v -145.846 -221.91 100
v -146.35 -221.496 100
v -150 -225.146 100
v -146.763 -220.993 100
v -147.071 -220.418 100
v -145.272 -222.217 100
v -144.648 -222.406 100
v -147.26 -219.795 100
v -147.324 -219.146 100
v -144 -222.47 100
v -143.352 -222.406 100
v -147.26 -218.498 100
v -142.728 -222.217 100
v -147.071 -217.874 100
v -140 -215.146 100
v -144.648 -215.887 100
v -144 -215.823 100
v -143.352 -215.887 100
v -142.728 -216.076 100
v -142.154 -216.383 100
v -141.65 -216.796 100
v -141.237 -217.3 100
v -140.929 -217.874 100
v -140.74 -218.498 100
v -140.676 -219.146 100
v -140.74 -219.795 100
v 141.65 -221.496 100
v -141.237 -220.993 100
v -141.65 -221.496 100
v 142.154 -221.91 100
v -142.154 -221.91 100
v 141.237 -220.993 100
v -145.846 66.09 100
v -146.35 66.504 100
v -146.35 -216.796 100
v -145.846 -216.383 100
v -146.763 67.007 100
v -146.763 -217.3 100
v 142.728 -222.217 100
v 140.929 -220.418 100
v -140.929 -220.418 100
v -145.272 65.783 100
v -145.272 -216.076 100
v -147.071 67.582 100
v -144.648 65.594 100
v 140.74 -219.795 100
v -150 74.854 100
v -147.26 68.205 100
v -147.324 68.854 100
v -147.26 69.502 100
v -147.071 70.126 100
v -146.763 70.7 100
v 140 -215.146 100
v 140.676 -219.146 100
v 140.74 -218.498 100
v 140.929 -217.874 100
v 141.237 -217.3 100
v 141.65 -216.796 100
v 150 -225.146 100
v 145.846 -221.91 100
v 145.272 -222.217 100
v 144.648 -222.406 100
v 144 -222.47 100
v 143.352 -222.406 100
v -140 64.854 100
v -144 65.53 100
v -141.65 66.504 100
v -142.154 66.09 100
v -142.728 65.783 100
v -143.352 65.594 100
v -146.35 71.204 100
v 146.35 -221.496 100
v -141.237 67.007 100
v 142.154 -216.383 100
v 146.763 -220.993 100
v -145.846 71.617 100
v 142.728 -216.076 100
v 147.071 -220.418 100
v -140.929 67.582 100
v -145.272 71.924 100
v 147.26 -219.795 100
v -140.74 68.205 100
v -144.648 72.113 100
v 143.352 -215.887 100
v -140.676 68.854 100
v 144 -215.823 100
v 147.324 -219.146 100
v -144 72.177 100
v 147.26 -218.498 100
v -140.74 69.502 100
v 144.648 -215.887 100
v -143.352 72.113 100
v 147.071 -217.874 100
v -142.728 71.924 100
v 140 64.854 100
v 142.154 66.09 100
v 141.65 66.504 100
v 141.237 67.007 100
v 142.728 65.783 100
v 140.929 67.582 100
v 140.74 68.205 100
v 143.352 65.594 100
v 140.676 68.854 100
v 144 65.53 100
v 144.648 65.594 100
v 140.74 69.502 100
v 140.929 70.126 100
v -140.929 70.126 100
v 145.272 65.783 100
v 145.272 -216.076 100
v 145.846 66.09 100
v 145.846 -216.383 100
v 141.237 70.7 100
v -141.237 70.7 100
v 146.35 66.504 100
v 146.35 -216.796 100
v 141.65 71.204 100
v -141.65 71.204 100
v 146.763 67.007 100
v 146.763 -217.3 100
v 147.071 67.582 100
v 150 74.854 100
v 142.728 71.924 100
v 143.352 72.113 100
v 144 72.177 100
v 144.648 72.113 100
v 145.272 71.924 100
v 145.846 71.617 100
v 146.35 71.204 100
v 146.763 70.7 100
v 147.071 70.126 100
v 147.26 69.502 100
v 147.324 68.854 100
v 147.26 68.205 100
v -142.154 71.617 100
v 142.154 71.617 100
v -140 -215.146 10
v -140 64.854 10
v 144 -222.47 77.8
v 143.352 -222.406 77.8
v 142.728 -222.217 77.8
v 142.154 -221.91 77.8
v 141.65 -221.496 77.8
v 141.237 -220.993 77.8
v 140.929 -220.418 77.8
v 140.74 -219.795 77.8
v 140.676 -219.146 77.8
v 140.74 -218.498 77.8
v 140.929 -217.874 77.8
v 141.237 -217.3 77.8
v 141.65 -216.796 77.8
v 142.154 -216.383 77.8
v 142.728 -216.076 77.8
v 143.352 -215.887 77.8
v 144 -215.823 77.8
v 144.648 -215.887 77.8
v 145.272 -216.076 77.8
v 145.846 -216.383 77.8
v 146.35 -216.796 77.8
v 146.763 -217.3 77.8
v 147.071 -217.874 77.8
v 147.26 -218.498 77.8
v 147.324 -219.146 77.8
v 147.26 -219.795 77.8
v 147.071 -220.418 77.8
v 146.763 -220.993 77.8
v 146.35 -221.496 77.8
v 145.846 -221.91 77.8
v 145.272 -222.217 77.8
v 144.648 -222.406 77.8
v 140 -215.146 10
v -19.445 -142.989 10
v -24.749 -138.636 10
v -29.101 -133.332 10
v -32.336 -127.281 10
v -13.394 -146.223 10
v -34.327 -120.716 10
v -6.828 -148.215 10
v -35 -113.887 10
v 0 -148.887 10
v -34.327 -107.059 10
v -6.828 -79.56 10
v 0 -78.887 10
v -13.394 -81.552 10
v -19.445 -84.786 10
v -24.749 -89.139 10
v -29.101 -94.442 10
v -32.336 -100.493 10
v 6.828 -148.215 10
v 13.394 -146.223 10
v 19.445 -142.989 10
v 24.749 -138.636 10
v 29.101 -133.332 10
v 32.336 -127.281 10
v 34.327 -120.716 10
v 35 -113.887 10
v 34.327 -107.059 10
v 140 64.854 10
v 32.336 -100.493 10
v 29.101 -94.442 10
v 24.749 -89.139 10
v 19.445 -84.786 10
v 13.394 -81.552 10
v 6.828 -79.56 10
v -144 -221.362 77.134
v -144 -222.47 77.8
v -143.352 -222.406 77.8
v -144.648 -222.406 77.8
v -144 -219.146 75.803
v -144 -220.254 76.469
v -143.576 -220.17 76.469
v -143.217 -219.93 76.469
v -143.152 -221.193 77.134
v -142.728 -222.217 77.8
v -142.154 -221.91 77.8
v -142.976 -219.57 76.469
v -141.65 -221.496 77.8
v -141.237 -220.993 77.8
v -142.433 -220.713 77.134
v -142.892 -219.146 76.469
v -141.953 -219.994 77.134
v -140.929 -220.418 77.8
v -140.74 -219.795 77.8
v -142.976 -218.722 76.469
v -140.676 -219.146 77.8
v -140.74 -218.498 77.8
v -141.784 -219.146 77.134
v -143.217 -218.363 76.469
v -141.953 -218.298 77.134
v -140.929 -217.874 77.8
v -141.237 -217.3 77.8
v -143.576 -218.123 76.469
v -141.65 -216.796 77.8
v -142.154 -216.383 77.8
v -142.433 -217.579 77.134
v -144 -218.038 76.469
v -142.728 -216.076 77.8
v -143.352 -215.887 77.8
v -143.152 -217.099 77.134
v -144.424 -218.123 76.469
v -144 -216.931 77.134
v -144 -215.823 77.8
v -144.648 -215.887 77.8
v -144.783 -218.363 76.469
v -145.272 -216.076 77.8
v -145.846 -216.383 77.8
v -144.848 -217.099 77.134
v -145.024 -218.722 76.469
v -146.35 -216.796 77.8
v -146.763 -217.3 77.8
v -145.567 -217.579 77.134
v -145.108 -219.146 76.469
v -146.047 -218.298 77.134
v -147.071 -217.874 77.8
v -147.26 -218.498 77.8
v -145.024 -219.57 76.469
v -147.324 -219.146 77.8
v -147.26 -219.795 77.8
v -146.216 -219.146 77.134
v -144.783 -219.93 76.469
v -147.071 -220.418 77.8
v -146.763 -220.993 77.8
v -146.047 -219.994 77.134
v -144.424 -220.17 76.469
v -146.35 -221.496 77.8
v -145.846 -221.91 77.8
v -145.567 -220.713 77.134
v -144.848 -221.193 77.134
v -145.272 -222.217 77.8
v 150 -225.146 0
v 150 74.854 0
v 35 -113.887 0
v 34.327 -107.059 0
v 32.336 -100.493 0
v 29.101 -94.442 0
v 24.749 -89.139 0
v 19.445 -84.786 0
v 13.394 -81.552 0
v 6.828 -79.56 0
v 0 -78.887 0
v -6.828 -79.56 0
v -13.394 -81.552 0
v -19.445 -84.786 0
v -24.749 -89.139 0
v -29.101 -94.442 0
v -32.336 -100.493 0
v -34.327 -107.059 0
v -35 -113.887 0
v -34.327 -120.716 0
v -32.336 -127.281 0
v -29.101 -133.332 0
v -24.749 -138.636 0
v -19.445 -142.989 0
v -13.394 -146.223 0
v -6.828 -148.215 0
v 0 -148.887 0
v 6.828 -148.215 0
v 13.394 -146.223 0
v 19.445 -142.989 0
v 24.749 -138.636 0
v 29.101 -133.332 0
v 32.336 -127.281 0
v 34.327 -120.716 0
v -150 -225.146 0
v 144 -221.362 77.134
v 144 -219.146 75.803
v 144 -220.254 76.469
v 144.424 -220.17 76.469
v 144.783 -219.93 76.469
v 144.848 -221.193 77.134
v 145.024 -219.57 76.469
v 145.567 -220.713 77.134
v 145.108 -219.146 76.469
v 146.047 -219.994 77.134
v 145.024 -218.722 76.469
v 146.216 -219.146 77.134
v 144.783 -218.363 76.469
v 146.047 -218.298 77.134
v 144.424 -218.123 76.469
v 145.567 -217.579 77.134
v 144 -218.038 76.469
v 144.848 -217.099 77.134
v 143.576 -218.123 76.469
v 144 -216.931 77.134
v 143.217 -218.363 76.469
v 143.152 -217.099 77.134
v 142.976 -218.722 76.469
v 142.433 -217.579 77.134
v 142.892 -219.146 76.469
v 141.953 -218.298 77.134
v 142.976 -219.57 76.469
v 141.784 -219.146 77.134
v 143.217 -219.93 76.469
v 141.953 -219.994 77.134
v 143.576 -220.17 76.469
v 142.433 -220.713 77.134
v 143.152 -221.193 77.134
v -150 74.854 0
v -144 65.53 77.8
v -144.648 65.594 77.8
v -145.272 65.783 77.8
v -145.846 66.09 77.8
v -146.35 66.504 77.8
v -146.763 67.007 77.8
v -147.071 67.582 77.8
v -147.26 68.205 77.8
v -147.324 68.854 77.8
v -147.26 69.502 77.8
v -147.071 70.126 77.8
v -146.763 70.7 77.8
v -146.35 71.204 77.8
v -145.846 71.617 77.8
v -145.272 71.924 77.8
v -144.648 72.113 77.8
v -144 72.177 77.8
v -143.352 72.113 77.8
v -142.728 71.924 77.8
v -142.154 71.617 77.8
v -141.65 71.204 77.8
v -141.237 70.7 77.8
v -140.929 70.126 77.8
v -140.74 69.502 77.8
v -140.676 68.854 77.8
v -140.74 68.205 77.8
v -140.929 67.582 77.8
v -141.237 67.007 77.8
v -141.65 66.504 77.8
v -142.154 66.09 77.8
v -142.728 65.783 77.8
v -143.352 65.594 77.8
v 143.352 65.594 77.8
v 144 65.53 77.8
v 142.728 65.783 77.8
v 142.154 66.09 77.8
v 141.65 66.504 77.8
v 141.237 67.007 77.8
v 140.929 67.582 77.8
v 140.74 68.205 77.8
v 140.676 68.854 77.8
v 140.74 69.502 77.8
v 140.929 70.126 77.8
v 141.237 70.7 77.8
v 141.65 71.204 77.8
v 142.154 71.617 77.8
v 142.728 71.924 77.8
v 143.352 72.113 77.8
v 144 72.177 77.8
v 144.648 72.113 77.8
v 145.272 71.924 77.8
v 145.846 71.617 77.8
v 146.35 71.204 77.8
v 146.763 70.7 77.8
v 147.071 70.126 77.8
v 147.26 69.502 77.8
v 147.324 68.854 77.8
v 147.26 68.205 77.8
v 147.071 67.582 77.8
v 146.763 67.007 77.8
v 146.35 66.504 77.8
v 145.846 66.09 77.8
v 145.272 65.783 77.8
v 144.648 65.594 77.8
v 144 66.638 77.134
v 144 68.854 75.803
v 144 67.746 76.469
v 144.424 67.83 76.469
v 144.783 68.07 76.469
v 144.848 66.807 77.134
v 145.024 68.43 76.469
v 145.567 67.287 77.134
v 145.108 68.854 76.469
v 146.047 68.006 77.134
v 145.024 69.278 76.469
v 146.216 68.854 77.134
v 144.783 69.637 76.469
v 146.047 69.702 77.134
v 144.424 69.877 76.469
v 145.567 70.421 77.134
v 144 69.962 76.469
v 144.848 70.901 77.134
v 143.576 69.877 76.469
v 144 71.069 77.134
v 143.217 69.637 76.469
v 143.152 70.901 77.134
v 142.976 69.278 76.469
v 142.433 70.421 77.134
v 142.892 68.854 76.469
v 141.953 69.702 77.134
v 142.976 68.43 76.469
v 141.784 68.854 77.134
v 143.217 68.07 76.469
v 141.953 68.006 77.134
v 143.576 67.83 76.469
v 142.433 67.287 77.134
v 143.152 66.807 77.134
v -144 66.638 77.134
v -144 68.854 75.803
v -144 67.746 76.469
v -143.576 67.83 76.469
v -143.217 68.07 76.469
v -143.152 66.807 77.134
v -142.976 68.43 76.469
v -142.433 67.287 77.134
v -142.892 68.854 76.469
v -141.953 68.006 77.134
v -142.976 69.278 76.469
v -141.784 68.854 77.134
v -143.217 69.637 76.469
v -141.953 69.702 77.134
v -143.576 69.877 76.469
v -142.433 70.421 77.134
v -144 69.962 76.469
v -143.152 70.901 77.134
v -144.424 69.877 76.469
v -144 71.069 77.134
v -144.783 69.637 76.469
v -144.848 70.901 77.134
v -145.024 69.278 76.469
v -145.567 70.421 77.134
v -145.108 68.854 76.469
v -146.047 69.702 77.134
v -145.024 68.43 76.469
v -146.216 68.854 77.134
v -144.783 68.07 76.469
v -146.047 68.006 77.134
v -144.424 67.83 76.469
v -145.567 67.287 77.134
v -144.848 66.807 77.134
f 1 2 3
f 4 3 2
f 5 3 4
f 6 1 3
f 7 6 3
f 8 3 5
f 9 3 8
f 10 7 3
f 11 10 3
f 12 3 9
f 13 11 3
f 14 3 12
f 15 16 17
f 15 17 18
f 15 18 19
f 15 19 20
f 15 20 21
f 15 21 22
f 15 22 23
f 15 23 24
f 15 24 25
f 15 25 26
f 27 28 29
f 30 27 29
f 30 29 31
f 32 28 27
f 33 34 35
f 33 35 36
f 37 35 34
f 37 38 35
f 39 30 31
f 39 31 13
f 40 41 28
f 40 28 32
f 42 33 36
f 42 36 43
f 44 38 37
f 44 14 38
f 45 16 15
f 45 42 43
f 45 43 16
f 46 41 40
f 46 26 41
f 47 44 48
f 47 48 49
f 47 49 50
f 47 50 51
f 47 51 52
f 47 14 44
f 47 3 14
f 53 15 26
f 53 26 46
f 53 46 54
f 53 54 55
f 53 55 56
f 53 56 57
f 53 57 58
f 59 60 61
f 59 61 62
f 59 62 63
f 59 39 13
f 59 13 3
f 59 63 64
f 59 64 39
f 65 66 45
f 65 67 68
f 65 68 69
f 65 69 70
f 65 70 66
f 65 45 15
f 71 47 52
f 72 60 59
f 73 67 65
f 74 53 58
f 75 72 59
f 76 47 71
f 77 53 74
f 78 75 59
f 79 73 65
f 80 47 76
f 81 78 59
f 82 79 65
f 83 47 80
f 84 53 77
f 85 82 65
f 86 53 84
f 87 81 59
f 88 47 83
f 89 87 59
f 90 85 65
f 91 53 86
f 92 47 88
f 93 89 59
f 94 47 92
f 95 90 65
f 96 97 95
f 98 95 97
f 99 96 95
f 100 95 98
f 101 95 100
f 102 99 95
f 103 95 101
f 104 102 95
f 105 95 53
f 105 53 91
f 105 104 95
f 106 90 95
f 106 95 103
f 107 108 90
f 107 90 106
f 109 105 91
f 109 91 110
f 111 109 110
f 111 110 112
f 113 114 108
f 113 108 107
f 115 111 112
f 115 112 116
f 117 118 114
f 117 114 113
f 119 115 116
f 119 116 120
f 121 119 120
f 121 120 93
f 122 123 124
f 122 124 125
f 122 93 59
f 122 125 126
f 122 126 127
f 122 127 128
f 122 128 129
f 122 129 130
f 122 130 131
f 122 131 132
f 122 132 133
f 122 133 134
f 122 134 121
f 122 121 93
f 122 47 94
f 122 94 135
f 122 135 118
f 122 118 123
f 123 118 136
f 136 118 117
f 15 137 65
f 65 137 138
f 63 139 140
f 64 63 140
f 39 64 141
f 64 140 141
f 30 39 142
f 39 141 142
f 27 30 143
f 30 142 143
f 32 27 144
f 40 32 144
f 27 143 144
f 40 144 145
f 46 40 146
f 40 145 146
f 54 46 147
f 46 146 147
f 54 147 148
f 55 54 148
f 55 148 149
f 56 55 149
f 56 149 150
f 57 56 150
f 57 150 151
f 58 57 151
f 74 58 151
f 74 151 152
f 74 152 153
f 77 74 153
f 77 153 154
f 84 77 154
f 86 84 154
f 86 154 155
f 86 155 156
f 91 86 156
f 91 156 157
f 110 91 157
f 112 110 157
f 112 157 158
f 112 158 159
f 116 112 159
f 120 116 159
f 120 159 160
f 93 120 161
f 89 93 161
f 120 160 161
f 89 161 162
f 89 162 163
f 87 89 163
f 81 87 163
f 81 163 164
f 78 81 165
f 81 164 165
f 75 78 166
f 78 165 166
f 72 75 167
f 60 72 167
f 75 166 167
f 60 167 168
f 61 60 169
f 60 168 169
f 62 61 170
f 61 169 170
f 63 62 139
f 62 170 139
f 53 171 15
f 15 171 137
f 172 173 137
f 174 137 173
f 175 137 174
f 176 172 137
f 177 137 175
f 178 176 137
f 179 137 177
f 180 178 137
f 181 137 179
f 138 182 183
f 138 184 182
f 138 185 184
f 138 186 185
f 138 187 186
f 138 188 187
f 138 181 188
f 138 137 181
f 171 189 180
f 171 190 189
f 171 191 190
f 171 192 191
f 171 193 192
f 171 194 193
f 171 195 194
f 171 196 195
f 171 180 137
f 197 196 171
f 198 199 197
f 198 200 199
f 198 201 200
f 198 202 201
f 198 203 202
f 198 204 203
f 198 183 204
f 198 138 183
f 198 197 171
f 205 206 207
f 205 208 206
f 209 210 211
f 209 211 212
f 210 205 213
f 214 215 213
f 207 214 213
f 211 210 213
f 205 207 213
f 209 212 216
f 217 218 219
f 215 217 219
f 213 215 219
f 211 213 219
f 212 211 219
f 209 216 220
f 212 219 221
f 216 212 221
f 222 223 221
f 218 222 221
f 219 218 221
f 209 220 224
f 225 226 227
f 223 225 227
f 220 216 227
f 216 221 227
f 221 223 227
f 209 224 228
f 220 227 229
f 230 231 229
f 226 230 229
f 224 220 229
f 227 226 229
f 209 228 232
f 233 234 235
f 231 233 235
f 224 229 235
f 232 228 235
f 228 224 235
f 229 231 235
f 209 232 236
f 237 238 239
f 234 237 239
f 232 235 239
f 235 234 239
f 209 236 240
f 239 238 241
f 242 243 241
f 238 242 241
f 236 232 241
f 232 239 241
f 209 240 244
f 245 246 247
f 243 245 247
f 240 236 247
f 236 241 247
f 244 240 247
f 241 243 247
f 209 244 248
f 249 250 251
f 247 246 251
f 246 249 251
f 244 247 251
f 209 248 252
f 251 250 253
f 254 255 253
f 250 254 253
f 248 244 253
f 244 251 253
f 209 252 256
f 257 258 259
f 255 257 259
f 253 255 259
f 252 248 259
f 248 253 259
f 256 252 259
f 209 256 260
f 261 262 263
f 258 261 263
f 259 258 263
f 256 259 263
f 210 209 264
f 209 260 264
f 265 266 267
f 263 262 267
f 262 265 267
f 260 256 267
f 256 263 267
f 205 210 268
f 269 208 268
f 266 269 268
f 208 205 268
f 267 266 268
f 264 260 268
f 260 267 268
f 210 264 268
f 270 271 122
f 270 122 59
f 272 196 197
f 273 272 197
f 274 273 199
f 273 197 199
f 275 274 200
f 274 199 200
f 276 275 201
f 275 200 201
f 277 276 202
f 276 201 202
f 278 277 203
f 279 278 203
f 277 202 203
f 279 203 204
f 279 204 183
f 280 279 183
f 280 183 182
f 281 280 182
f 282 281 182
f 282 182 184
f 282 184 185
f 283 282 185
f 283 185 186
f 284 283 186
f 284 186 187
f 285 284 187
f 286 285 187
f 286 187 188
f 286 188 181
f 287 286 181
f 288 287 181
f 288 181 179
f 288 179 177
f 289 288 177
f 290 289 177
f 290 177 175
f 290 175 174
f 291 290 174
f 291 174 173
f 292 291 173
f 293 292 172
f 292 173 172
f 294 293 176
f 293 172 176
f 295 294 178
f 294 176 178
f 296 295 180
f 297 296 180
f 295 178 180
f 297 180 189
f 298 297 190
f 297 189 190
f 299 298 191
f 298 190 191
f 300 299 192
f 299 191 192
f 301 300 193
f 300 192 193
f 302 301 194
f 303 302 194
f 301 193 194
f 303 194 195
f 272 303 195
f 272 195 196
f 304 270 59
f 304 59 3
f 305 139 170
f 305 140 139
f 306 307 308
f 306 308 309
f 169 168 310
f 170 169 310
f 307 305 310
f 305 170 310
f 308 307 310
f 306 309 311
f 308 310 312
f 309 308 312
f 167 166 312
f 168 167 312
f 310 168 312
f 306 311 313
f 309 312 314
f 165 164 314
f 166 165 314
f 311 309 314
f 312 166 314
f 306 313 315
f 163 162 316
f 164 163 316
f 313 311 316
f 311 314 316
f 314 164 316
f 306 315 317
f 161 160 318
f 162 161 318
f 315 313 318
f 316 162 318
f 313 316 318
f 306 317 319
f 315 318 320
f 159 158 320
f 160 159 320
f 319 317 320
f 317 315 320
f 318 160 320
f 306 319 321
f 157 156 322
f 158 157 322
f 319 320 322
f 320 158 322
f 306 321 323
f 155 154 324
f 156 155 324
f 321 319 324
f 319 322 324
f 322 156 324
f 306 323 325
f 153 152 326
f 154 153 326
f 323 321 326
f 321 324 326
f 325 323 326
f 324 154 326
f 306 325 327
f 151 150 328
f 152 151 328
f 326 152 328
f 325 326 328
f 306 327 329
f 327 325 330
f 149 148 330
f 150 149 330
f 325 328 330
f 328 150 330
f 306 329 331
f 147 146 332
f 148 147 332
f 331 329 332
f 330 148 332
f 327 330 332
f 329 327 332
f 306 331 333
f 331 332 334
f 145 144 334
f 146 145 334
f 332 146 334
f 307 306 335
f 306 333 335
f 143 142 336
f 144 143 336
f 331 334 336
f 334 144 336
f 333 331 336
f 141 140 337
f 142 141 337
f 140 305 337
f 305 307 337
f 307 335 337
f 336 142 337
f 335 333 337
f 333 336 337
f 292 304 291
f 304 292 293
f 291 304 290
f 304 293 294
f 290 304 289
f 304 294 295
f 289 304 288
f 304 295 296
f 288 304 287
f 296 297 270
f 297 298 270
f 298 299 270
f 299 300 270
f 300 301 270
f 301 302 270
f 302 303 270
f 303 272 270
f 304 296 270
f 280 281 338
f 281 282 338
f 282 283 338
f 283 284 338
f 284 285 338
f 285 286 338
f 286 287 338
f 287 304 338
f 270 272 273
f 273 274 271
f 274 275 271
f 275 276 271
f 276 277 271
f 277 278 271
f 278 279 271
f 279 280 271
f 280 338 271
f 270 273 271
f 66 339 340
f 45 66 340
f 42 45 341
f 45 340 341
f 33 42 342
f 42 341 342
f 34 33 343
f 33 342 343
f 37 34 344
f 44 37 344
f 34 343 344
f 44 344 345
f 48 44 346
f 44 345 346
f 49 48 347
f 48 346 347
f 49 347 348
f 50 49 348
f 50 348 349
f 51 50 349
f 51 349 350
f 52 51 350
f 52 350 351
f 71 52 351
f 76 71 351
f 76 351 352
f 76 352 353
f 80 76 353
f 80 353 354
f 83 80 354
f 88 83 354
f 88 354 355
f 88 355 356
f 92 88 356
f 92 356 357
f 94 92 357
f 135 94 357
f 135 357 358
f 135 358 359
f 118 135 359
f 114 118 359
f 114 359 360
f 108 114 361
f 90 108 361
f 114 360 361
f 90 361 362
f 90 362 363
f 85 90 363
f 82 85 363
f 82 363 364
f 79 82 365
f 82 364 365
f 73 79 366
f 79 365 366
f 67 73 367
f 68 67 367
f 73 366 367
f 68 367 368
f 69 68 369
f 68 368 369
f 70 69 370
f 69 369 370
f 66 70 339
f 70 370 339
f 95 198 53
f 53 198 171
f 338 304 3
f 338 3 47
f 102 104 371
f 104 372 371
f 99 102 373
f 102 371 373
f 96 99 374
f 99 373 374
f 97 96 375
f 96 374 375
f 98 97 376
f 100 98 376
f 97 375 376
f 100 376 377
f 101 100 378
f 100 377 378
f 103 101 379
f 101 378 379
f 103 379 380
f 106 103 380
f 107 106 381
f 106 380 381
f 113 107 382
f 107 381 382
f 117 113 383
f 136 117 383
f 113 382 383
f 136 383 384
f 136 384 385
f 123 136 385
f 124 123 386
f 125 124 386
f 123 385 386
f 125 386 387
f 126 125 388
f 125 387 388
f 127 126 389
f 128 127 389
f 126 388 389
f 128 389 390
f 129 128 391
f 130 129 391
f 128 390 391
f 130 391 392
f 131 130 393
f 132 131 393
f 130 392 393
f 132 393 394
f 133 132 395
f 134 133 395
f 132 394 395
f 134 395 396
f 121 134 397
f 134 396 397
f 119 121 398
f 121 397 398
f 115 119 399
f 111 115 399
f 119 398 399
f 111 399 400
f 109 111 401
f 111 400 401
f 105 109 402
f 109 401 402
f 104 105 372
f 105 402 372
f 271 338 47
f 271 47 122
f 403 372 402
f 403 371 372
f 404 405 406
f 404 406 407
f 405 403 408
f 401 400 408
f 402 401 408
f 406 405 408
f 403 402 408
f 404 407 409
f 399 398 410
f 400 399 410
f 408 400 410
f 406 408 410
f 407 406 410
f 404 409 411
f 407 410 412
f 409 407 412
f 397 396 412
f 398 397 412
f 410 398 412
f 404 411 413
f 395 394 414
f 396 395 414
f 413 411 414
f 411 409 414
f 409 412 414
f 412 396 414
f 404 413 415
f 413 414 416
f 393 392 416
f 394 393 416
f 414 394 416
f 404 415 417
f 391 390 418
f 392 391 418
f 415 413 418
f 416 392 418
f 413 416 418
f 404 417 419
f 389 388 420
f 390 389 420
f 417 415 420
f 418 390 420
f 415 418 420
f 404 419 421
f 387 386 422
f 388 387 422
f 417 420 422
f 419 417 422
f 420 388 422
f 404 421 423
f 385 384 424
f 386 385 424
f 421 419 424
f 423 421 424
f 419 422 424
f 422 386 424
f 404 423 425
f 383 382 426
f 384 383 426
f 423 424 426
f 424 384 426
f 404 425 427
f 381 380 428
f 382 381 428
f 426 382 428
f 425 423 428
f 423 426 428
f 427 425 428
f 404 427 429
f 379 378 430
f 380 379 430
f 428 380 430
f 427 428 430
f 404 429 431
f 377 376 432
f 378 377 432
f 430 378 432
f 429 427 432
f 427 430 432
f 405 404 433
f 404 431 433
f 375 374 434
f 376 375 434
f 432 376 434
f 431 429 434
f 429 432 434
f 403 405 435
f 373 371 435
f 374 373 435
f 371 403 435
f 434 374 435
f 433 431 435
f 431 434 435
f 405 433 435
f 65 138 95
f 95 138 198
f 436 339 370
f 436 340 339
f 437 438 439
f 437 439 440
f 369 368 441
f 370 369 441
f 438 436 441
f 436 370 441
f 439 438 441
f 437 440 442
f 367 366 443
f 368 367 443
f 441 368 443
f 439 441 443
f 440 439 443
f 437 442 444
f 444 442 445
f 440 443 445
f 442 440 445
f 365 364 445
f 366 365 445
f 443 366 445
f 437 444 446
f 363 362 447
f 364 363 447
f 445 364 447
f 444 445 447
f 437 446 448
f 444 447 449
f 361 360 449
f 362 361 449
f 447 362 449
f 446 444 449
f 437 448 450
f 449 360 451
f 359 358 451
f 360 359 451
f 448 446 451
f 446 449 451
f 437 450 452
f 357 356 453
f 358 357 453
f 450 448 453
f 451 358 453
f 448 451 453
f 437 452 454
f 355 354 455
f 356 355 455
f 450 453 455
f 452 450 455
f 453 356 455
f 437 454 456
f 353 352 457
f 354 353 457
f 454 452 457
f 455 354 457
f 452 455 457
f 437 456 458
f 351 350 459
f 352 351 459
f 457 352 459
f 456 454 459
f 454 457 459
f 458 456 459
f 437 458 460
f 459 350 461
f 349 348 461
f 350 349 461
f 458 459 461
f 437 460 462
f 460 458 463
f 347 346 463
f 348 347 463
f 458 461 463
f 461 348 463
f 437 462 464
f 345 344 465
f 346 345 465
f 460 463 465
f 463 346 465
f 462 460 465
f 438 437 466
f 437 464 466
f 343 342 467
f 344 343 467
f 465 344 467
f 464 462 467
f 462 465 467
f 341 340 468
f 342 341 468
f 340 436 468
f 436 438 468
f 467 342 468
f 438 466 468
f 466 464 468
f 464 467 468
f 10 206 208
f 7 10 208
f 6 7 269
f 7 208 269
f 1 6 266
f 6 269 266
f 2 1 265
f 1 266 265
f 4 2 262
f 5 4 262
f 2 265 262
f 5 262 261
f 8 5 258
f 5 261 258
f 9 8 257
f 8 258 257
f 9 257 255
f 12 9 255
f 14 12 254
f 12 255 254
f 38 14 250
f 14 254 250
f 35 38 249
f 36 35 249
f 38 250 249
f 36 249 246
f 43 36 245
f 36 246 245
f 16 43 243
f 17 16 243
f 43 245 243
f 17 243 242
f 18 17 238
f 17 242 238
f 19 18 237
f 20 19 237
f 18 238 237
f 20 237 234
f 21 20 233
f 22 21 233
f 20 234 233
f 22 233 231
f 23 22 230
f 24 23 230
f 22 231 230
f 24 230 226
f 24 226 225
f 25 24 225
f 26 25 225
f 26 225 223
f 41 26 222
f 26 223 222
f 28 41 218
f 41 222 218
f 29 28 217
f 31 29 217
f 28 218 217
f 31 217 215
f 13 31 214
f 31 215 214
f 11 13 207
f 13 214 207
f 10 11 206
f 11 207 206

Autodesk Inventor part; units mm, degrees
ref_plane "YZ Plane" through (0, 0, 0) normal (1, 0, 0) x (0, 1, 0)
ref_plane "XZ Plane" through (0, 0, 0) normal (0, 1, 0) x (-1, 0, 0)
ref_plane "XY Plane" through (0, 0, 0) normal (0, 0, 1) x (1, 0, 0)
sketch "Sketch1" plane through (0, 0, 0) normal (0, 0, 1) x (1, 0, 0)
  line L0 (-150, 74.8538) -> (150, 74.8538)
  line L1 (150, 74.8538) -> (150, -225.1462)
  line L2 (150, -225.1462) -> (-150, -225.1462)
  line L3 (-150, -225.1462) -> (-150, 74.8538)
  point P0 (0, 0)
  dimension "d0" = 300
  dimension "d1" = 300
  dimension "d2" = 150
extrude "Extrusion1" add sketch "Sketch1" along normal blind 100
shell "Shell1" thickness 10 removed faces 1 at (-50, -25.1462, 100)
sketch "Sketch2" plane through (-140, 64.8538, 10) normal (0, 0, 1) x (1, 0, 0)
  circle A0 centre (140, -178.7412) radius 35 projected
  circle A1 centre (140, -178.7412) radius 35 projected
  circle A2 centre (140, -178.7412) radius 35
  point P0 (140, -64.8538)
extrude "Extrusion2" cut sketch "Sketch2" against normal up to next
sketch "Sketch3" plane through (0, 0, 100) normal (0, 0, 1) x (1, 0, 0)
  line L0 (-140, 64.8538) -> (140, 64.8538) projected
  line L1 (-150, 74.8538) -> (-150, -225.1462) projected
  line L2 (150, -225.1462) -> (150, 74.8538) projected
  line L3 (140, -215.1462) -> (-140, -215.1462) projected
  point P0 (0, 0)
  point P1 (-144, 68.8538)
  point P2 (144, 68.8538)
  point P3 (144, -219.1462)
  point P4 (-144, -219.1462)
  dimension "d8" = 4
  dimension "d9" = 6
  dimension "d10" = 6
  dimension "d11" = 6
  dimension "d12" = 6
  dimension "d13" = 4
  dimension "d14" = 4
  dimension "d15" = 4
hole "Hole1" at (-144, 68.8538, 100) at (144, 68.8538, 100) at (144, -219.1462, 100) at (-144, -219.1462, 100) direction (0, 0, -1) diameter 6.647 depth 22.2 tip angle 118 thread size "M8x1.25" class "6H" standard "ISO Metric profile"
properties part number "aanstuurkast"
